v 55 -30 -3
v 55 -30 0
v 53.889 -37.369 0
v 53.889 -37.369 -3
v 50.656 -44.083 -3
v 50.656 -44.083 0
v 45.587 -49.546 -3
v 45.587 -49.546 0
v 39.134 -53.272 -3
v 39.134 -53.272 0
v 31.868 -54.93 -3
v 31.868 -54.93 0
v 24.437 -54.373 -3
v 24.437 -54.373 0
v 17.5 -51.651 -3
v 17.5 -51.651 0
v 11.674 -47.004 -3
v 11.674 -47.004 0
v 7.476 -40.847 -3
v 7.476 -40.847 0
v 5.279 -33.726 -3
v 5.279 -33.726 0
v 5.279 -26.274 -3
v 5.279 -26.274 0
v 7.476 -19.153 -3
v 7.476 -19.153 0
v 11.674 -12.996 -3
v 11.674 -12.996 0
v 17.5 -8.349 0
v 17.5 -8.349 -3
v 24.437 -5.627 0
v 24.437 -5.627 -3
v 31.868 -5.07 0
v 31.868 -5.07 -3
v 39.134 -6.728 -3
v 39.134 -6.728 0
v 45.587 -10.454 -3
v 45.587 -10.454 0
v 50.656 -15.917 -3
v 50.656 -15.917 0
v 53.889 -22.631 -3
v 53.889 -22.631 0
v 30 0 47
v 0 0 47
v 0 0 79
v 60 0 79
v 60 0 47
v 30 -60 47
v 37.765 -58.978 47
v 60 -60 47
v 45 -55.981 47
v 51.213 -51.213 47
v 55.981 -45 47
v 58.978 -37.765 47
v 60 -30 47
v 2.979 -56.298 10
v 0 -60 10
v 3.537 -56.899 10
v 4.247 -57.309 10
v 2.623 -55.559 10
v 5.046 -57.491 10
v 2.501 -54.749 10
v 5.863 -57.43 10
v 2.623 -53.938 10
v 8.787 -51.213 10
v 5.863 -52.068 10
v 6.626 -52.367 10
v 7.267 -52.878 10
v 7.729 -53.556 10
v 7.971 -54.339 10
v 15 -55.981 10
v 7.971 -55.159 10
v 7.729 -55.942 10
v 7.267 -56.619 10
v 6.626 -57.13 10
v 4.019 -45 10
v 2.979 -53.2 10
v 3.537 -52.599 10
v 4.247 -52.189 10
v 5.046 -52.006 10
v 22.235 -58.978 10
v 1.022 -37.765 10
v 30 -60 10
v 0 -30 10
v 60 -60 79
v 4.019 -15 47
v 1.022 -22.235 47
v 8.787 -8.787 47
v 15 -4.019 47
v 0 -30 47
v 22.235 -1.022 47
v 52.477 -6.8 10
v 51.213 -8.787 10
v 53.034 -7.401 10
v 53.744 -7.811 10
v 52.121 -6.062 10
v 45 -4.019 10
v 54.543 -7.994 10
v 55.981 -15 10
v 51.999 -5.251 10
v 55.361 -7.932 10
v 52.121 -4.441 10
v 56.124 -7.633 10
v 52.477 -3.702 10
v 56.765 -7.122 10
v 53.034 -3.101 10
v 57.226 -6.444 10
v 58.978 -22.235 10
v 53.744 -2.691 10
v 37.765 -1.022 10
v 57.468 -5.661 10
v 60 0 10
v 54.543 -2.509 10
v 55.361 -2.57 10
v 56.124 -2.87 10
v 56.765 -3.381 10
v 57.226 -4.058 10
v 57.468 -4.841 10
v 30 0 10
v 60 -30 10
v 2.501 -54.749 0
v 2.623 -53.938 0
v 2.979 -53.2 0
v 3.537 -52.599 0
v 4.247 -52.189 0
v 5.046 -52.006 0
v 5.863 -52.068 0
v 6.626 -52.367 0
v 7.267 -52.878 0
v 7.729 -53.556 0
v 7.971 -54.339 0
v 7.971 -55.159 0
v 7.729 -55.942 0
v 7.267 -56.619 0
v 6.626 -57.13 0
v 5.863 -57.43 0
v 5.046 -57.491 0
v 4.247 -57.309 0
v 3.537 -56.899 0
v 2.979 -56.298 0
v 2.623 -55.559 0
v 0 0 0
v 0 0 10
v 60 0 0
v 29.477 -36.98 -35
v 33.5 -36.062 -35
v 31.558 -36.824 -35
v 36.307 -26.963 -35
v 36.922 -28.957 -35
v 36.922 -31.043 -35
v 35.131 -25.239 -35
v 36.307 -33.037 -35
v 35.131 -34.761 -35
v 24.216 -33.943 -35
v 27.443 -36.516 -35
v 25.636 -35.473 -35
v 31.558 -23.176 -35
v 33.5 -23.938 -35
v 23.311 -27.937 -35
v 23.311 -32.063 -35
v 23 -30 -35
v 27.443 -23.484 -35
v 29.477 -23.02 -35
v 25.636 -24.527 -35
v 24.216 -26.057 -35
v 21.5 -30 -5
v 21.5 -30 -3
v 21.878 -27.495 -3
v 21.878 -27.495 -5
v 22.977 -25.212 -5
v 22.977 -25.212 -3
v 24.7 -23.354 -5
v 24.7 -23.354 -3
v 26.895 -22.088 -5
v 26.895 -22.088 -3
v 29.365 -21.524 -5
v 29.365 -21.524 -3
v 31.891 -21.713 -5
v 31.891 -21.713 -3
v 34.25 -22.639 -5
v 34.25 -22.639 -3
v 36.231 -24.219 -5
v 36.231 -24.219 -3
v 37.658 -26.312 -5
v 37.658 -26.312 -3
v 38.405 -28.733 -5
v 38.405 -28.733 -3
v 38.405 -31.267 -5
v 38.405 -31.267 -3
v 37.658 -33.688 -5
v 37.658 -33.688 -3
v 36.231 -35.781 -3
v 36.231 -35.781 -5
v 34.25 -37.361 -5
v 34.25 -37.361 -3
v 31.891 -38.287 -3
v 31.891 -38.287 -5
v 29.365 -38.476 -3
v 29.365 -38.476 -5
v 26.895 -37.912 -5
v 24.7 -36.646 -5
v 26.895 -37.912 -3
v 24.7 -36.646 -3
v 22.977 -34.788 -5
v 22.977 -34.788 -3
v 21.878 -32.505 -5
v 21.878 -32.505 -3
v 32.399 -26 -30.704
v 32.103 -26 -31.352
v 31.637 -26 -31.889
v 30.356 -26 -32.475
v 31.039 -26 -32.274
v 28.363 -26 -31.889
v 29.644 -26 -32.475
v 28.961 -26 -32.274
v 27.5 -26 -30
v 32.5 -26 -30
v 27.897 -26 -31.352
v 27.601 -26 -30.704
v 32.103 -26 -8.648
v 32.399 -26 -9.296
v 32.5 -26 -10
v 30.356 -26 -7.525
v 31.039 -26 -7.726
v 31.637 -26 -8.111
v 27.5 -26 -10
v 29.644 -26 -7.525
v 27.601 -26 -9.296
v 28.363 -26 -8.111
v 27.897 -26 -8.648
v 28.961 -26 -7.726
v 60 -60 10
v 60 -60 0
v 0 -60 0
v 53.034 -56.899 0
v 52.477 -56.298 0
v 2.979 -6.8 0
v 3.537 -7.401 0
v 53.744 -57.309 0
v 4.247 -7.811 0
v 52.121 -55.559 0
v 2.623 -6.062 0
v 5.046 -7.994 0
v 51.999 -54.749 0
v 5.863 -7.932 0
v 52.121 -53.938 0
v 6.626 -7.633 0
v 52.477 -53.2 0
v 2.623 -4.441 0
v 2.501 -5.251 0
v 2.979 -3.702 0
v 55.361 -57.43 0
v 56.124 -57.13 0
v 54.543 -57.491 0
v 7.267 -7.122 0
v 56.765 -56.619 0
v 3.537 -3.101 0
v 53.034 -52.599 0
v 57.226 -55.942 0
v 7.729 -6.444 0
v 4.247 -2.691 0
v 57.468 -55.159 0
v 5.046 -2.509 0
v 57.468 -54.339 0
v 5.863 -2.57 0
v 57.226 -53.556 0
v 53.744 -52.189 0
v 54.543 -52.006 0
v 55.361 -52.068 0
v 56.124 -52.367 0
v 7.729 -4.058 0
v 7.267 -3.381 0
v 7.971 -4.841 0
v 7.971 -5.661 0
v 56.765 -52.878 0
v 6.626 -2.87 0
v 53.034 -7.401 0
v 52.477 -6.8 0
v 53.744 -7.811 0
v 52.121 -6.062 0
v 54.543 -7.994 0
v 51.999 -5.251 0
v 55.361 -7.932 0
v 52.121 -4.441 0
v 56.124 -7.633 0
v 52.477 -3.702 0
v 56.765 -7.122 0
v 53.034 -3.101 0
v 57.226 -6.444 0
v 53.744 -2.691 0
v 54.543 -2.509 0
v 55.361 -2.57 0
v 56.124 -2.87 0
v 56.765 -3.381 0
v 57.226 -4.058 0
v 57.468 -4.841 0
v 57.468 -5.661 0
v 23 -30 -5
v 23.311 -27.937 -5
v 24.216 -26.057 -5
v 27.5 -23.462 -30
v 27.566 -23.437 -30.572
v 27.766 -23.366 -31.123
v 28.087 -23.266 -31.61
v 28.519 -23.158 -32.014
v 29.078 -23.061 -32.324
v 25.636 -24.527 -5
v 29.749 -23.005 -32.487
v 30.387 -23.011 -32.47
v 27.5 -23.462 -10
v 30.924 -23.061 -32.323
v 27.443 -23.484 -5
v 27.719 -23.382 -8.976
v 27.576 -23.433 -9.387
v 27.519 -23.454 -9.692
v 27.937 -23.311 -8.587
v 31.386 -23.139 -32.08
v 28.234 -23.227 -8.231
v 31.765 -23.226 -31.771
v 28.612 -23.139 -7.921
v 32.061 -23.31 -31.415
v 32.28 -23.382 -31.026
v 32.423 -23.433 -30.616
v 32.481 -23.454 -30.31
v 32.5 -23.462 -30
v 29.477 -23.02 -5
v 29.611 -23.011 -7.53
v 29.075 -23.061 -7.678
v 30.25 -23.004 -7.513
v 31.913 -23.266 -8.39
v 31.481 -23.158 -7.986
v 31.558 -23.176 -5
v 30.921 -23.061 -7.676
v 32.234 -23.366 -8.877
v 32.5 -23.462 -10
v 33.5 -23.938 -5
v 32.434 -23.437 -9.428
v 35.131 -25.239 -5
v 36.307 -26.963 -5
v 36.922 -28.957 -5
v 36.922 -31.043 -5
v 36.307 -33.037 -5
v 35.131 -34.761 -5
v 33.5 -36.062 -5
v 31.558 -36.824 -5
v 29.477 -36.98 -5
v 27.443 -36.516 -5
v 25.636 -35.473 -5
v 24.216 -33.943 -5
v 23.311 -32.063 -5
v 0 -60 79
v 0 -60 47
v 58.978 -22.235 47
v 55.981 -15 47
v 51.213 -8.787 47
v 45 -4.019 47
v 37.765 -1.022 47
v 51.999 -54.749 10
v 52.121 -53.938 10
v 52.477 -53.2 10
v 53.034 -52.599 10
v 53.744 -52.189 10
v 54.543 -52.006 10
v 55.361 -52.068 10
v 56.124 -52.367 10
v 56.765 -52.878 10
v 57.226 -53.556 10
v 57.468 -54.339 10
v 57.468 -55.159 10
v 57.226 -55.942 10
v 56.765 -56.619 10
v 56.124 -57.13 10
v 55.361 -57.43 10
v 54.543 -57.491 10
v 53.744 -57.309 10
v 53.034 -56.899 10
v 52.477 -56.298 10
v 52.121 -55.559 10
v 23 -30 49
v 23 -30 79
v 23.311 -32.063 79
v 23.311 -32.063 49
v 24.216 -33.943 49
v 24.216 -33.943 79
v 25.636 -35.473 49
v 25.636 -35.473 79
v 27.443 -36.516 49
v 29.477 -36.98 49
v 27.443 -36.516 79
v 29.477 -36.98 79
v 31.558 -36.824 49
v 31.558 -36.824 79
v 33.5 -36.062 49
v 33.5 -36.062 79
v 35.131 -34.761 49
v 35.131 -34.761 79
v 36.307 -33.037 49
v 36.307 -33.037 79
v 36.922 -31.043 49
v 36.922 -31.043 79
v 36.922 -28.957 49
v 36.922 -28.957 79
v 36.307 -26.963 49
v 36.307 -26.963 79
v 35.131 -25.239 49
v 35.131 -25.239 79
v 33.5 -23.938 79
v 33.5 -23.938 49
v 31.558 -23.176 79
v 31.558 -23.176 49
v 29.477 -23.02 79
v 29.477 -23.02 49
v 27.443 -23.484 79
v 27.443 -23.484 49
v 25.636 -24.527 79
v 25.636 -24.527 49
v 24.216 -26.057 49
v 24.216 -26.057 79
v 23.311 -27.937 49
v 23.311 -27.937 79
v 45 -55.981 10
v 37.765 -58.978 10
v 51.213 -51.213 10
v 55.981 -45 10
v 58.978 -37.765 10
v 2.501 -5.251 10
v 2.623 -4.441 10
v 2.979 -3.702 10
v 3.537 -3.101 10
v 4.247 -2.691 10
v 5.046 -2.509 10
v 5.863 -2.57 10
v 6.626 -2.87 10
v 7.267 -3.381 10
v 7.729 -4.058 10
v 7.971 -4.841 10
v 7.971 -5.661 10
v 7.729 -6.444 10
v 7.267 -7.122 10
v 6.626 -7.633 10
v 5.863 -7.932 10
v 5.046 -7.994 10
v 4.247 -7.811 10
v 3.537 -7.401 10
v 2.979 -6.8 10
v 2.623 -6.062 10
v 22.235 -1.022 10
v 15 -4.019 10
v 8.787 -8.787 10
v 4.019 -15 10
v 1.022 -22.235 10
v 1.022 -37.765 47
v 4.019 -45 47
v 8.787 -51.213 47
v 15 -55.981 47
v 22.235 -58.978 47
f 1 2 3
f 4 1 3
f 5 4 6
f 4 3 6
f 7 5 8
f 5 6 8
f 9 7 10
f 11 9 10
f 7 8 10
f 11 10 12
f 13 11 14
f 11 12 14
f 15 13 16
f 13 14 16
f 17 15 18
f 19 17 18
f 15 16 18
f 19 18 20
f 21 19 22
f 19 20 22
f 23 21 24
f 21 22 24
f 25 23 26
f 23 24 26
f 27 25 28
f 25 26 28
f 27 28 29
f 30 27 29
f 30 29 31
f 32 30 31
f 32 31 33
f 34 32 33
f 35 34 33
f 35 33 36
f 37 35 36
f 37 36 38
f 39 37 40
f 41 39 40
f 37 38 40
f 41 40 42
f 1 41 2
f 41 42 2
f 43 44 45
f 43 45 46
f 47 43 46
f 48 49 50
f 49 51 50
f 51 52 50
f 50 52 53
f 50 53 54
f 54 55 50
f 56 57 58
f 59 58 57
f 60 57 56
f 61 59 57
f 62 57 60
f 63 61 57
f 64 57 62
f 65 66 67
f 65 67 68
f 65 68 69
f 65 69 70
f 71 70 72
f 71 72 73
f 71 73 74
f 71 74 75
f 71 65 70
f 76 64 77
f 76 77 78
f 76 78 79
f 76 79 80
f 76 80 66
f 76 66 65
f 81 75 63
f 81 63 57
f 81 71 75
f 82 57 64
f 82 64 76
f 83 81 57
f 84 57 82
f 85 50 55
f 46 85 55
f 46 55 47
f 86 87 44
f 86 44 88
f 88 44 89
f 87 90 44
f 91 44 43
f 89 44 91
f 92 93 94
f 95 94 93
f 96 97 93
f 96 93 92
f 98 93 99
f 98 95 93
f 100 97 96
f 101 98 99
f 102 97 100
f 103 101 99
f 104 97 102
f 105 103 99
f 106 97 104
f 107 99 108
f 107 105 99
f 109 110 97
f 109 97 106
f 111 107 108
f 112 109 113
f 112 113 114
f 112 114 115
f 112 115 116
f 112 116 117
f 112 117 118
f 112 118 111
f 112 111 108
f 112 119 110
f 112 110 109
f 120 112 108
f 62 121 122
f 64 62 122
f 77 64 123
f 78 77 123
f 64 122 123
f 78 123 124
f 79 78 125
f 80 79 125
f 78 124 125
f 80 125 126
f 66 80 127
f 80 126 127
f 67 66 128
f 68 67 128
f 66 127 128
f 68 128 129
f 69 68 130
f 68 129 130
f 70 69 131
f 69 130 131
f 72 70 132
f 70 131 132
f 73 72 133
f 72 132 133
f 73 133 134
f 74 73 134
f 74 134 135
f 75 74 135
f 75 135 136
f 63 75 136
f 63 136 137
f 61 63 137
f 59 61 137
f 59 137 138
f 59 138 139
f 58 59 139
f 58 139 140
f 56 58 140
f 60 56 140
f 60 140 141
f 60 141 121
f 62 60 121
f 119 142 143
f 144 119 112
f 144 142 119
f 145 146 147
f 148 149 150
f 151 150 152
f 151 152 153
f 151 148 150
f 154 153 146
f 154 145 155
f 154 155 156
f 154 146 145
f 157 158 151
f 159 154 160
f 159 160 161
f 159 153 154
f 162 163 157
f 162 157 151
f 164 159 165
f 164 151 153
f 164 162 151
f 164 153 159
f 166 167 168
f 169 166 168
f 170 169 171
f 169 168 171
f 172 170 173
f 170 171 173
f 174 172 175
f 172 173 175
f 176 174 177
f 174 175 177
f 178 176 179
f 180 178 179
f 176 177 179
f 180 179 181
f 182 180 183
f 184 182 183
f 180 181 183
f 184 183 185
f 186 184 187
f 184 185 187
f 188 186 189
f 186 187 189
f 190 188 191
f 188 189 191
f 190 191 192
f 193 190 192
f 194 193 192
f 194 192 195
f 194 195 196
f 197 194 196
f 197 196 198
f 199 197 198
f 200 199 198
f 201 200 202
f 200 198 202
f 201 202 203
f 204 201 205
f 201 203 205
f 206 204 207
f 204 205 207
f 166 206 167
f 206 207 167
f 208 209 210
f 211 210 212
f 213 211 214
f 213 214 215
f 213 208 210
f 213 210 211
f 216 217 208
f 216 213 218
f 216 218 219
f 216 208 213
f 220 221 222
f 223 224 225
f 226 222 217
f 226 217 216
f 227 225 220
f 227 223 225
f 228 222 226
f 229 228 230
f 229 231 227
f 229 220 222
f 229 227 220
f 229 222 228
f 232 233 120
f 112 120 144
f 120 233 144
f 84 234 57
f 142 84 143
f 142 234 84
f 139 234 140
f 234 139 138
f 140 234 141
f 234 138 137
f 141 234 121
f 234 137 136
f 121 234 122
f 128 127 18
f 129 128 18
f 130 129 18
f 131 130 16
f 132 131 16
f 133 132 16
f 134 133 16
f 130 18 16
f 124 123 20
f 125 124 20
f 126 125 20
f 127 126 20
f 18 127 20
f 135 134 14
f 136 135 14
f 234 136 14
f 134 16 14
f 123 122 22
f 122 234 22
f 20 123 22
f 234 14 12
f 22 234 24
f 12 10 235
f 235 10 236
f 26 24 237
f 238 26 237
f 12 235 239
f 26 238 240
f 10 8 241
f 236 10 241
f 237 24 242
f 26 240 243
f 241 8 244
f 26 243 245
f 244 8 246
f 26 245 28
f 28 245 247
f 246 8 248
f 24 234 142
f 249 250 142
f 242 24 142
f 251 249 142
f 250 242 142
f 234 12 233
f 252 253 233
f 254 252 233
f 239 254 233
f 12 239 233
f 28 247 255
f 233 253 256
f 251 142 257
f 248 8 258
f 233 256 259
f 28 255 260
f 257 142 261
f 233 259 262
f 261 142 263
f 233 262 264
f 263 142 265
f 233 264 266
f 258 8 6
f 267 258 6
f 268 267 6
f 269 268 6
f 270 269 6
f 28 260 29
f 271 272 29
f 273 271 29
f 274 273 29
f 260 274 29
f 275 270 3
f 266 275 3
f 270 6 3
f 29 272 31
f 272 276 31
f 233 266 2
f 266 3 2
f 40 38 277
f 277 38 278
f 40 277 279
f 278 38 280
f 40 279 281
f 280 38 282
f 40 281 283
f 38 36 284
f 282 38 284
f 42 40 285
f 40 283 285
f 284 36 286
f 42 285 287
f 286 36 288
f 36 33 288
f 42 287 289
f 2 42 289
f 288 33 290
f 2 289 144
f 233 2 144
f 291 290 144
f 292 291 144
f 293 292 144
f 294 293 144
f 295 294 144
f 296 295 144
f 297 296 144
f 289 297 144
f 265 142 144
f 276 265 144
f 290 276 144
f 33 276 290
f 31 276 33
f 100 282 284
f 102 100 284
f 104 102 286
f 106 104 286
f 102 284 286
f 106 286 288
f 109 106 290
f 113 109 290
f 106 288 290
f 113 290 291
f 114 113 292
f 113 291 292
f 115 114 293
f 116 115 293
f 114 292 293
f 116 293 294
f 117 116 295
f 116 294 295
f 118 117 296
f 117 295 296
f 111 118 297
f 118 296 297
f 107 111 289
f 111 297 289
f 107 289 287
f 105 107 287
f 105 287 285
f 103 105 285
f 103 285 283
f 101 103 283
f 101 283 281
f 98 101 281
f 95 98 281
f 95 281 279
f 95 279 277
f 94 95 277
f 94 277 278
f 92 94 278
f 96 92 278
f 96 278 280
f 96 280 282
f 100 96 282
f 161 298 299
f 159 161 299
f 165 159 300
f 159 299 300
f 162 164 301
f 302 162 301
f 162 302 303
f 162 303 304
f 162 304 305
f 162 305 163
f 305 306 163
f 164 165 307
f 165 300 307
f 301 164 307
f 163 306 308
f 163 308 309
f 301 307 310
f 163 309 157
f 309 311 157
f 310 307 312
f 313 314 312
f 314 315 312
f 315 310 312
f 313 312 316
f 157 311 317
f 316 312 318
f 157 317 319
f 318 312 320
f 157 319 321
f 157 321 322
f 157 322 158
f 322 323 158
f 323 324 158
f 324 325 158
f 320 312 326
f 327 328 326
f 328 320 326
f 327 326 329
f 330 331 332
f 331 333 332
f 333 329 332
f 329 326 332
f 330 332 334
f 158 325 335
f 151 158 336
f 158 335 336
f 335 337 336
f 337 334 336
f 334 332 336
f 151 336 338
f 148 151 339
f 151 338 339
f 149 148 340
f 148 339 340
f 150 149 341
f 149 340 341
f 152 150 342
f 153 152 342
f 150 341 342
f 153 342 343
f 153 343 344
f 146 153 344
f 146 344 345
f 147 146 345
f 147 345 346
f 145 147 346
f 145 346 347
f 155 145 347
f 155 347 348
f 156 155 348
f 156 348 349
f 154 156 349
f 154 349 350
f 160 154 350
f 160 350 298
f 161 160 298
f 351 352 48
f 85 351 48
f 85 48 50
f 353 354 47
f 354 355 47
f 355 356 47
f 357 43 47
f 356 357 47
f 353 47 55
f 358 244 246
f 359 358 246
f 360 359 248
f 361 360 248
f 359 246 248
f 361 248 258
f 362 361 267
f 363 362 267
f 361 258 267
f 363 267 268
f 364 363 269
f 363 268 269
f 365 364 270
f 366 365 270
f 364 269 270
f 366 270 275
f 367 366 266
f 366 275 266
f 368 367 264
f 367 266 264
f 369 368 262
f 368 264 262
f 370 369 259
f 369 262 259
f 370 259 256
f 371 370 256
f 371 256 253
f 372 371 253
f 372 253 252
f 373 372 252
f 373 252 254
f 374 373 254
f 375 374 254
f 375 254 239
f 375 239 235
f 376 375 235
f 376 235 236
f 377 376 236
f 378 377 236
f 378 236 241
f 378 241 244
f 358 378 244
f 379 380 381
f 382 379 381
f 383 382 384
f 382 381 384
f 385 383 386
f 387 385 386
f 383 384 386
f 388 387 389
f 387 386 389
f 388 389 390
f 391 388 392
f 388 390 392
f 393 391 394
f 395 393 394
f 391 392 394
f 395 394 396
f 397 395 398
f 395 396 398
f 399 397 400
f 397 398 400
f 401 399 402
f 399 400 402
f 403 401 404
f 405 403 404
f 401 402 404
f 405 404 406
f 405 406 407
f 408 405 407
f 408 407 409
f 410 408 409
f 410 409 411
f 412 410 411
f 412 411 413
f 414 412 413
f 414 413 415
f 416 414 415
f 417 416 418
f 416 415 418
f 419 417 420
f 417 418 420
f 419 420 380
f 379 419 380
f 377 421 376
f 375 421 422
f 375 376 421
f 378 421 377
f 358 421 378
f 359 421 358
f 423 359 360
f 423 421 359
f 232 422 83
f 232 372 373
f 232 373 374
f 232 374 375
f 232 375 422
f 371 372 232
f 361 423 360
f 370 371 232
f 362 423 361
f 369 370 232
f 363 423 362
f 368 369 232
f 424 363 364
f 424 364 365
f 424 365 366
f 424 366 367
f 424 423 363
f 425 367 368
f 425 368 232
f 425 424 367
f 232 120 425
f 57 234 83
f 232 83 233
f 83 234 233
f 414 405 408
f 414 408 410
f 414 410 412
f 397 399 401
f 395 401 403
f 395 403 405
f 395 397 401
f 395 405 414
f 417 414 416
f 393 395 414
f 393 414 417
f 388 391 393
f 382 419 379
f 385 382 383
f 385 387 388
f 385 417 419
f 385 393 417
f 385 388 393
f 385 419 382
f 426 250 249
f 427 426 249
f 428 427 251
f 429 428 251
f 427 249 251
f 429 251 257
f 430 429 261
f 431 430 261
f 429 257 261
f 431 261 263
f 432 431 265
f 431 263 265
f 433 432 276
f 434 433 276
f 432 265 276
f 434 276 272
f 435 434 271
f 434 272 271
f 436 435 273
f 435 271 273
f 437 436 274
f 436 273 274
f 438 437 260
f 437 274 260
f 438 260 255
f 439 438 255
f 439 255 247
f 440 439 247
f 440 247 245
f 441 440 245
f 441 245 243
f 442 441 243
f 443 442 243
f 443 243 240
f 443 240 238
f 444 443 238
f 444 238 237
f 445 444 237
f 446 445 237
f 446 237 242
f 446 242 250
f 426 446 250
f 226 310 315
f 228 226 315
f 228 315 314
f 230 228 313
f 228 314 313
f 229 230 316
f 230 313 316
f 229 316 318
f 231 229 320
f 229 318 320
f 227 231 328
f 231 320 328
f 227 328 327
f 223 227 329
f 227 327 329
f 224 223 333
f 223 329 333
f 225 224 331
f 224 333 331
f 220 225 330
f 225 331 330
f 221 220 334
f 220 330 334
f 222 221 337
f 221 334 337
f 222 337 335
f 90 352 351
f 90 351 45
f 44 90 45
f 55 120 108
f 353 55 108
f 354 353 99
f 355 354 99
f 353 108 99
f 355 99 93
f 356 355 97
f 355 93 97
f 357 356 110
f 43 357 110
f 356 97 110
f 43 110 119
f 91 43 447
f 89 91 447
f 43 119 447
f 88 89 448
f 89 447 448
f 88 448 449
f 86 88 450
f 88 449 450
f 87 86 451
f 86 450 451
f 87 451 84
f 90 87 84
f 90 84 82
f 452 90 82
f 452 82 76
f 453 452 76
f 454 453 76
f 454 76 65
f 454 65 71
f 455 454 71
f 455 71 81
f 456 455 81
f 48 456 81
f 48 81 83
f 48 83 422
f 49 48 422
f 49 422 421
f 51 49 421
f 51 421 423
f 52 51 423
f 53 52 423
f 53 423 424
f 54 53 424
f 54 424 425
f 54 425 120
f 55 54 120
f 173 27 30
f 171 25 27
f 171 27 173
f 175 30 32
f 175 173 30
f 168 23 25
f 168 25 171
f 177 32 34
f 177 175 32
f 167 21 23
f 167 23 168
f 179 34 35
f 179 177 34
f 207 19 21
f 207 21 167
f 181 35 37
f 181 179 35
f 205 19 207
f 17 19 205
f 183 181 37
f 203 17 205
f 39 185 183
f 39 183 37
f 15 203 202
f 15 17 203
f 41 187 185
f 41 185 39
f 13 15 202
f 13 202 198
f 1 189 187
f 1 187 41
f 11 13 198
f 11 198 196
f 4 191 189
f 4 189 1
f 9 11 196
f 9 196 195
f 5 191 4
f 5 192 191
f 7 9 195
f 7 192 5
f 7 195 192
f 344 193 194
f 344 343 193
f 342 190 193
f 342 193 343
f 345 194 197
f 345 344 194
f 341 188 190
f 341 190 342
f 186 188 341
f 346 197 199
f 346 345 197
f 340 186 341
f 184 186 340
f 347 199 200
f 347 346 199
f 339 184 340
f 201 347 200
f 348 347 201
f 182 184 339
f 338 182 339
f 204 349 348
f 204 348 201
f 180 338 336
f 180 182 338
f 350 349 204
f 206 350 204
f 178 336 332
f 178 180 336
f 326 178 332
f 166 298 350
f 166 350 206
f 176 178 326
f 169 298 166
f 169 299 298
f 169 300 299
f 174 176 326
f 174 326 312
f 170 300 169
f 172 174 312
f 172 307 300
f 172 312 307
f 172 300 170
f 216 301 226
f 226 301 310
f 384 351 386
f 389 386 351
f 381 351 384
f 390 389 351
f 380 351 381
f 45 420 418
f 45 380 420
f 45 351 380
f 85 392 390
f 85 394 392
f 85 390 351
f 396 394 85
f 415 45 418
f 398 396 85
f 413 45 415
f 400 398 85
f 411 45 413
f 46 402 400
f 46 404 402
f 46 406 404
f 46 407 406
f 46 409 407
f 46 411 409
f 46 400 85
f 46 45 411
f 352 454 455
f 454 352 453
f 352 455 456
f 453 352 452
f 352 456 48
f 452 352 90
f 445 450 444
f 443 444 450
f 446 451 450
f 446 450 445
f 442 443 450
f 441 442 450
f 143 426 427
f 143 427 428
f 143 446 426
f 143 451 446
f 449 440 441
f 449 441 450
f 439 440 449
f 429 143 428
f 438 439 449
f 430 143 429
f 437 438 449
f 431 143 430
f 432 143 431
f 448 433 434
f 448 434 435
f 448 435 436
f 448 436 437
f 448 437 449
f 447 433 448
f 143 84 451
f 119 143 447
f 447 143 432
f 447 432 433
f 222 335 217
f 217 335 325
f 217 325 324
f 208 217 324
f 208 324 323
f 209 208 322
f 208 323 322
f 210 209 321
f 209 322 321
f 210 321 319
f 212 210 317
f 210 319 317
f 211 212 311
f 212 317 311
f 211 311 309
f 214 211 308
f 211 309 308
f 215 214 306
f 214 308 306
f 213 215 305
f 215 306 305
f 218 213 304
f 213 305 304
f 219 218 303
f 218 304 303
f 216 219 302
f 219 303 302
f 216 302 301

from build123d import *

# Parameters (mm, degrees)
SKETCH_1_W          = 60
SKETCH_1_H          = 60
EXTRUDE_1_DEPTH     = 10
SKETCH_3_R          = 30
EXTRUDE_2_DEPTH     = 37
SKETCH_4_W          = 60
SKETCH_4_H          = 60
EXTRUDE_3_DEPTH     = 32
SKETCH_5_R          = 25
EXTRUDE_4_DEPTH     = 3
SKETCH_6_R          = 8.5
EXTRUDE_5_DEPTH     = 2
SKETCH_7_R          = 7
EXTRUDE_6_DEPTH     = 30
SKETCH_8_R          = 7
CUT_EXTRUDE_1_DEPTH = 30
SKETCH_9_R          = 2.75
CUT_EXTRUDE_2_DEPTH = 30
CUT_EXTRUDE_3_DEPTH = 3


with BuildPart() as part:
    # 草图1 → 拉伸1 (new body)
    with BuildSketch(Plane.XY):
        with Locations((30, -30)):
            Rectangle(SKETCH_1_W, SKETCH_1_H)
    extrude(amount=EXTRUDE_1_DEPTH)

    # 草图3 → 拉伸2 (add)
    with BuildSketch(Plane.XY.offset(10)):
        with Locations((30, -30)):
            Circle(SKETCH_3_R)
    extrude(amount=EXTRUDE_2_DEPTH)

    # 草图4 → 拉伸3 (add)
    with BuildSketch(Plane.XY.offset(47)):
        with Locations((30, -30)):
            Rectangle(SKETCH_4_W, SKETCH_4_H)
    extrude(amount=EXTRUDE_3_DEPTH)

    # 草图5 → 拉伸4 (add)
    with BuildSketch(Plane(origin=(0, 0, 0), x_dir=(-1, 0, 0), z_dir=(0, 0, -1))):
        with Locations(Location((-30, -30, 0), (0, 0, 180))):
            Circle(SKETCH_5_R)
    extrude(amount=EXTRUDE_4_DEPTH)

    # 草图6 → 拉伸5 (add)
    with BuildSketch(Plane(origin=(0, 0, -3), x_dir=(-1, 0, 0), z_dir=(0, 0, -1))):
        with Locations((-30, -30)):
            Circle(SKETCH_6_R)
    extrude(amount=EXTRUDE_5_DEPTH)

    # 草图7 → 拉伸6 (add)
    with BuildSketch(Plane(origin=(0, 0, -5), x_dir=(-1, 0, 0), z_dir=(0, 0, -1))):
        with Locations((-30, -30)):
            Circle(SKETCH_7_R)
    extrude(amount=EXTRUDE_6_DEPTH)

    # 草图8 → 切除-拉伸1 (cut)
    with BuildSketch(Plane.XY.offset(79)):
        with Locations(Location((30, -30, 0), (0, 0, 180))):
            Circle(SKETCH_8_R)
    extrude(amount=-CUT_EXTRUDE_1_DEPTH, mode=Mode.SUBTRACT)

    # 草图9 → 切除-拉伸2 (cut)
    with BuildSketch(Plane(origin=(0, 0, 0), x_dir=(-1, 0, 0), z_dir=(0, 0, -1))):
        with Locations((-5.251262658, -5.251262658)):
            Circle(SKETCH_9_R)
        with Locations((-5.251262658, -54.748737342)):
            Circle(SKETCH_9_R)
        with Locations((-54.748737342, -54.748737342)):
            Circle(SKETCH_9_R)
        with Locations((-54.748737342, -5.251262658)):
            Circle(SKETCH_9_R)
    extrude(amount=-CUT_EXTRUDE_2_DEPTH, mode=Mode.SUBTRACT)

    # 草图10 → 切除-拉伸3 (cut)
    with BuildSketch(Plane(origin=(0, -23, 0), x_dir=(-1, 0, 0), z_dir=(0, 1, 0))):
        with BuildLine():
            Line((-32.5, -10), (-32.5, -30))
            ThreePointArc((-32.5, -30), (-30, -32.5), (-27.5, -30))
            Line((-27.5, -30), (-27.5, -10))
            ThreePointArc((-27.5, -10), (-30, -7.5), (-32.5, -10))
        make_face()
    extrude(amount=-CUT_EXTRUDE_3_DEPTH, mode=Mode.SUBTRACT)


solid = part.part
